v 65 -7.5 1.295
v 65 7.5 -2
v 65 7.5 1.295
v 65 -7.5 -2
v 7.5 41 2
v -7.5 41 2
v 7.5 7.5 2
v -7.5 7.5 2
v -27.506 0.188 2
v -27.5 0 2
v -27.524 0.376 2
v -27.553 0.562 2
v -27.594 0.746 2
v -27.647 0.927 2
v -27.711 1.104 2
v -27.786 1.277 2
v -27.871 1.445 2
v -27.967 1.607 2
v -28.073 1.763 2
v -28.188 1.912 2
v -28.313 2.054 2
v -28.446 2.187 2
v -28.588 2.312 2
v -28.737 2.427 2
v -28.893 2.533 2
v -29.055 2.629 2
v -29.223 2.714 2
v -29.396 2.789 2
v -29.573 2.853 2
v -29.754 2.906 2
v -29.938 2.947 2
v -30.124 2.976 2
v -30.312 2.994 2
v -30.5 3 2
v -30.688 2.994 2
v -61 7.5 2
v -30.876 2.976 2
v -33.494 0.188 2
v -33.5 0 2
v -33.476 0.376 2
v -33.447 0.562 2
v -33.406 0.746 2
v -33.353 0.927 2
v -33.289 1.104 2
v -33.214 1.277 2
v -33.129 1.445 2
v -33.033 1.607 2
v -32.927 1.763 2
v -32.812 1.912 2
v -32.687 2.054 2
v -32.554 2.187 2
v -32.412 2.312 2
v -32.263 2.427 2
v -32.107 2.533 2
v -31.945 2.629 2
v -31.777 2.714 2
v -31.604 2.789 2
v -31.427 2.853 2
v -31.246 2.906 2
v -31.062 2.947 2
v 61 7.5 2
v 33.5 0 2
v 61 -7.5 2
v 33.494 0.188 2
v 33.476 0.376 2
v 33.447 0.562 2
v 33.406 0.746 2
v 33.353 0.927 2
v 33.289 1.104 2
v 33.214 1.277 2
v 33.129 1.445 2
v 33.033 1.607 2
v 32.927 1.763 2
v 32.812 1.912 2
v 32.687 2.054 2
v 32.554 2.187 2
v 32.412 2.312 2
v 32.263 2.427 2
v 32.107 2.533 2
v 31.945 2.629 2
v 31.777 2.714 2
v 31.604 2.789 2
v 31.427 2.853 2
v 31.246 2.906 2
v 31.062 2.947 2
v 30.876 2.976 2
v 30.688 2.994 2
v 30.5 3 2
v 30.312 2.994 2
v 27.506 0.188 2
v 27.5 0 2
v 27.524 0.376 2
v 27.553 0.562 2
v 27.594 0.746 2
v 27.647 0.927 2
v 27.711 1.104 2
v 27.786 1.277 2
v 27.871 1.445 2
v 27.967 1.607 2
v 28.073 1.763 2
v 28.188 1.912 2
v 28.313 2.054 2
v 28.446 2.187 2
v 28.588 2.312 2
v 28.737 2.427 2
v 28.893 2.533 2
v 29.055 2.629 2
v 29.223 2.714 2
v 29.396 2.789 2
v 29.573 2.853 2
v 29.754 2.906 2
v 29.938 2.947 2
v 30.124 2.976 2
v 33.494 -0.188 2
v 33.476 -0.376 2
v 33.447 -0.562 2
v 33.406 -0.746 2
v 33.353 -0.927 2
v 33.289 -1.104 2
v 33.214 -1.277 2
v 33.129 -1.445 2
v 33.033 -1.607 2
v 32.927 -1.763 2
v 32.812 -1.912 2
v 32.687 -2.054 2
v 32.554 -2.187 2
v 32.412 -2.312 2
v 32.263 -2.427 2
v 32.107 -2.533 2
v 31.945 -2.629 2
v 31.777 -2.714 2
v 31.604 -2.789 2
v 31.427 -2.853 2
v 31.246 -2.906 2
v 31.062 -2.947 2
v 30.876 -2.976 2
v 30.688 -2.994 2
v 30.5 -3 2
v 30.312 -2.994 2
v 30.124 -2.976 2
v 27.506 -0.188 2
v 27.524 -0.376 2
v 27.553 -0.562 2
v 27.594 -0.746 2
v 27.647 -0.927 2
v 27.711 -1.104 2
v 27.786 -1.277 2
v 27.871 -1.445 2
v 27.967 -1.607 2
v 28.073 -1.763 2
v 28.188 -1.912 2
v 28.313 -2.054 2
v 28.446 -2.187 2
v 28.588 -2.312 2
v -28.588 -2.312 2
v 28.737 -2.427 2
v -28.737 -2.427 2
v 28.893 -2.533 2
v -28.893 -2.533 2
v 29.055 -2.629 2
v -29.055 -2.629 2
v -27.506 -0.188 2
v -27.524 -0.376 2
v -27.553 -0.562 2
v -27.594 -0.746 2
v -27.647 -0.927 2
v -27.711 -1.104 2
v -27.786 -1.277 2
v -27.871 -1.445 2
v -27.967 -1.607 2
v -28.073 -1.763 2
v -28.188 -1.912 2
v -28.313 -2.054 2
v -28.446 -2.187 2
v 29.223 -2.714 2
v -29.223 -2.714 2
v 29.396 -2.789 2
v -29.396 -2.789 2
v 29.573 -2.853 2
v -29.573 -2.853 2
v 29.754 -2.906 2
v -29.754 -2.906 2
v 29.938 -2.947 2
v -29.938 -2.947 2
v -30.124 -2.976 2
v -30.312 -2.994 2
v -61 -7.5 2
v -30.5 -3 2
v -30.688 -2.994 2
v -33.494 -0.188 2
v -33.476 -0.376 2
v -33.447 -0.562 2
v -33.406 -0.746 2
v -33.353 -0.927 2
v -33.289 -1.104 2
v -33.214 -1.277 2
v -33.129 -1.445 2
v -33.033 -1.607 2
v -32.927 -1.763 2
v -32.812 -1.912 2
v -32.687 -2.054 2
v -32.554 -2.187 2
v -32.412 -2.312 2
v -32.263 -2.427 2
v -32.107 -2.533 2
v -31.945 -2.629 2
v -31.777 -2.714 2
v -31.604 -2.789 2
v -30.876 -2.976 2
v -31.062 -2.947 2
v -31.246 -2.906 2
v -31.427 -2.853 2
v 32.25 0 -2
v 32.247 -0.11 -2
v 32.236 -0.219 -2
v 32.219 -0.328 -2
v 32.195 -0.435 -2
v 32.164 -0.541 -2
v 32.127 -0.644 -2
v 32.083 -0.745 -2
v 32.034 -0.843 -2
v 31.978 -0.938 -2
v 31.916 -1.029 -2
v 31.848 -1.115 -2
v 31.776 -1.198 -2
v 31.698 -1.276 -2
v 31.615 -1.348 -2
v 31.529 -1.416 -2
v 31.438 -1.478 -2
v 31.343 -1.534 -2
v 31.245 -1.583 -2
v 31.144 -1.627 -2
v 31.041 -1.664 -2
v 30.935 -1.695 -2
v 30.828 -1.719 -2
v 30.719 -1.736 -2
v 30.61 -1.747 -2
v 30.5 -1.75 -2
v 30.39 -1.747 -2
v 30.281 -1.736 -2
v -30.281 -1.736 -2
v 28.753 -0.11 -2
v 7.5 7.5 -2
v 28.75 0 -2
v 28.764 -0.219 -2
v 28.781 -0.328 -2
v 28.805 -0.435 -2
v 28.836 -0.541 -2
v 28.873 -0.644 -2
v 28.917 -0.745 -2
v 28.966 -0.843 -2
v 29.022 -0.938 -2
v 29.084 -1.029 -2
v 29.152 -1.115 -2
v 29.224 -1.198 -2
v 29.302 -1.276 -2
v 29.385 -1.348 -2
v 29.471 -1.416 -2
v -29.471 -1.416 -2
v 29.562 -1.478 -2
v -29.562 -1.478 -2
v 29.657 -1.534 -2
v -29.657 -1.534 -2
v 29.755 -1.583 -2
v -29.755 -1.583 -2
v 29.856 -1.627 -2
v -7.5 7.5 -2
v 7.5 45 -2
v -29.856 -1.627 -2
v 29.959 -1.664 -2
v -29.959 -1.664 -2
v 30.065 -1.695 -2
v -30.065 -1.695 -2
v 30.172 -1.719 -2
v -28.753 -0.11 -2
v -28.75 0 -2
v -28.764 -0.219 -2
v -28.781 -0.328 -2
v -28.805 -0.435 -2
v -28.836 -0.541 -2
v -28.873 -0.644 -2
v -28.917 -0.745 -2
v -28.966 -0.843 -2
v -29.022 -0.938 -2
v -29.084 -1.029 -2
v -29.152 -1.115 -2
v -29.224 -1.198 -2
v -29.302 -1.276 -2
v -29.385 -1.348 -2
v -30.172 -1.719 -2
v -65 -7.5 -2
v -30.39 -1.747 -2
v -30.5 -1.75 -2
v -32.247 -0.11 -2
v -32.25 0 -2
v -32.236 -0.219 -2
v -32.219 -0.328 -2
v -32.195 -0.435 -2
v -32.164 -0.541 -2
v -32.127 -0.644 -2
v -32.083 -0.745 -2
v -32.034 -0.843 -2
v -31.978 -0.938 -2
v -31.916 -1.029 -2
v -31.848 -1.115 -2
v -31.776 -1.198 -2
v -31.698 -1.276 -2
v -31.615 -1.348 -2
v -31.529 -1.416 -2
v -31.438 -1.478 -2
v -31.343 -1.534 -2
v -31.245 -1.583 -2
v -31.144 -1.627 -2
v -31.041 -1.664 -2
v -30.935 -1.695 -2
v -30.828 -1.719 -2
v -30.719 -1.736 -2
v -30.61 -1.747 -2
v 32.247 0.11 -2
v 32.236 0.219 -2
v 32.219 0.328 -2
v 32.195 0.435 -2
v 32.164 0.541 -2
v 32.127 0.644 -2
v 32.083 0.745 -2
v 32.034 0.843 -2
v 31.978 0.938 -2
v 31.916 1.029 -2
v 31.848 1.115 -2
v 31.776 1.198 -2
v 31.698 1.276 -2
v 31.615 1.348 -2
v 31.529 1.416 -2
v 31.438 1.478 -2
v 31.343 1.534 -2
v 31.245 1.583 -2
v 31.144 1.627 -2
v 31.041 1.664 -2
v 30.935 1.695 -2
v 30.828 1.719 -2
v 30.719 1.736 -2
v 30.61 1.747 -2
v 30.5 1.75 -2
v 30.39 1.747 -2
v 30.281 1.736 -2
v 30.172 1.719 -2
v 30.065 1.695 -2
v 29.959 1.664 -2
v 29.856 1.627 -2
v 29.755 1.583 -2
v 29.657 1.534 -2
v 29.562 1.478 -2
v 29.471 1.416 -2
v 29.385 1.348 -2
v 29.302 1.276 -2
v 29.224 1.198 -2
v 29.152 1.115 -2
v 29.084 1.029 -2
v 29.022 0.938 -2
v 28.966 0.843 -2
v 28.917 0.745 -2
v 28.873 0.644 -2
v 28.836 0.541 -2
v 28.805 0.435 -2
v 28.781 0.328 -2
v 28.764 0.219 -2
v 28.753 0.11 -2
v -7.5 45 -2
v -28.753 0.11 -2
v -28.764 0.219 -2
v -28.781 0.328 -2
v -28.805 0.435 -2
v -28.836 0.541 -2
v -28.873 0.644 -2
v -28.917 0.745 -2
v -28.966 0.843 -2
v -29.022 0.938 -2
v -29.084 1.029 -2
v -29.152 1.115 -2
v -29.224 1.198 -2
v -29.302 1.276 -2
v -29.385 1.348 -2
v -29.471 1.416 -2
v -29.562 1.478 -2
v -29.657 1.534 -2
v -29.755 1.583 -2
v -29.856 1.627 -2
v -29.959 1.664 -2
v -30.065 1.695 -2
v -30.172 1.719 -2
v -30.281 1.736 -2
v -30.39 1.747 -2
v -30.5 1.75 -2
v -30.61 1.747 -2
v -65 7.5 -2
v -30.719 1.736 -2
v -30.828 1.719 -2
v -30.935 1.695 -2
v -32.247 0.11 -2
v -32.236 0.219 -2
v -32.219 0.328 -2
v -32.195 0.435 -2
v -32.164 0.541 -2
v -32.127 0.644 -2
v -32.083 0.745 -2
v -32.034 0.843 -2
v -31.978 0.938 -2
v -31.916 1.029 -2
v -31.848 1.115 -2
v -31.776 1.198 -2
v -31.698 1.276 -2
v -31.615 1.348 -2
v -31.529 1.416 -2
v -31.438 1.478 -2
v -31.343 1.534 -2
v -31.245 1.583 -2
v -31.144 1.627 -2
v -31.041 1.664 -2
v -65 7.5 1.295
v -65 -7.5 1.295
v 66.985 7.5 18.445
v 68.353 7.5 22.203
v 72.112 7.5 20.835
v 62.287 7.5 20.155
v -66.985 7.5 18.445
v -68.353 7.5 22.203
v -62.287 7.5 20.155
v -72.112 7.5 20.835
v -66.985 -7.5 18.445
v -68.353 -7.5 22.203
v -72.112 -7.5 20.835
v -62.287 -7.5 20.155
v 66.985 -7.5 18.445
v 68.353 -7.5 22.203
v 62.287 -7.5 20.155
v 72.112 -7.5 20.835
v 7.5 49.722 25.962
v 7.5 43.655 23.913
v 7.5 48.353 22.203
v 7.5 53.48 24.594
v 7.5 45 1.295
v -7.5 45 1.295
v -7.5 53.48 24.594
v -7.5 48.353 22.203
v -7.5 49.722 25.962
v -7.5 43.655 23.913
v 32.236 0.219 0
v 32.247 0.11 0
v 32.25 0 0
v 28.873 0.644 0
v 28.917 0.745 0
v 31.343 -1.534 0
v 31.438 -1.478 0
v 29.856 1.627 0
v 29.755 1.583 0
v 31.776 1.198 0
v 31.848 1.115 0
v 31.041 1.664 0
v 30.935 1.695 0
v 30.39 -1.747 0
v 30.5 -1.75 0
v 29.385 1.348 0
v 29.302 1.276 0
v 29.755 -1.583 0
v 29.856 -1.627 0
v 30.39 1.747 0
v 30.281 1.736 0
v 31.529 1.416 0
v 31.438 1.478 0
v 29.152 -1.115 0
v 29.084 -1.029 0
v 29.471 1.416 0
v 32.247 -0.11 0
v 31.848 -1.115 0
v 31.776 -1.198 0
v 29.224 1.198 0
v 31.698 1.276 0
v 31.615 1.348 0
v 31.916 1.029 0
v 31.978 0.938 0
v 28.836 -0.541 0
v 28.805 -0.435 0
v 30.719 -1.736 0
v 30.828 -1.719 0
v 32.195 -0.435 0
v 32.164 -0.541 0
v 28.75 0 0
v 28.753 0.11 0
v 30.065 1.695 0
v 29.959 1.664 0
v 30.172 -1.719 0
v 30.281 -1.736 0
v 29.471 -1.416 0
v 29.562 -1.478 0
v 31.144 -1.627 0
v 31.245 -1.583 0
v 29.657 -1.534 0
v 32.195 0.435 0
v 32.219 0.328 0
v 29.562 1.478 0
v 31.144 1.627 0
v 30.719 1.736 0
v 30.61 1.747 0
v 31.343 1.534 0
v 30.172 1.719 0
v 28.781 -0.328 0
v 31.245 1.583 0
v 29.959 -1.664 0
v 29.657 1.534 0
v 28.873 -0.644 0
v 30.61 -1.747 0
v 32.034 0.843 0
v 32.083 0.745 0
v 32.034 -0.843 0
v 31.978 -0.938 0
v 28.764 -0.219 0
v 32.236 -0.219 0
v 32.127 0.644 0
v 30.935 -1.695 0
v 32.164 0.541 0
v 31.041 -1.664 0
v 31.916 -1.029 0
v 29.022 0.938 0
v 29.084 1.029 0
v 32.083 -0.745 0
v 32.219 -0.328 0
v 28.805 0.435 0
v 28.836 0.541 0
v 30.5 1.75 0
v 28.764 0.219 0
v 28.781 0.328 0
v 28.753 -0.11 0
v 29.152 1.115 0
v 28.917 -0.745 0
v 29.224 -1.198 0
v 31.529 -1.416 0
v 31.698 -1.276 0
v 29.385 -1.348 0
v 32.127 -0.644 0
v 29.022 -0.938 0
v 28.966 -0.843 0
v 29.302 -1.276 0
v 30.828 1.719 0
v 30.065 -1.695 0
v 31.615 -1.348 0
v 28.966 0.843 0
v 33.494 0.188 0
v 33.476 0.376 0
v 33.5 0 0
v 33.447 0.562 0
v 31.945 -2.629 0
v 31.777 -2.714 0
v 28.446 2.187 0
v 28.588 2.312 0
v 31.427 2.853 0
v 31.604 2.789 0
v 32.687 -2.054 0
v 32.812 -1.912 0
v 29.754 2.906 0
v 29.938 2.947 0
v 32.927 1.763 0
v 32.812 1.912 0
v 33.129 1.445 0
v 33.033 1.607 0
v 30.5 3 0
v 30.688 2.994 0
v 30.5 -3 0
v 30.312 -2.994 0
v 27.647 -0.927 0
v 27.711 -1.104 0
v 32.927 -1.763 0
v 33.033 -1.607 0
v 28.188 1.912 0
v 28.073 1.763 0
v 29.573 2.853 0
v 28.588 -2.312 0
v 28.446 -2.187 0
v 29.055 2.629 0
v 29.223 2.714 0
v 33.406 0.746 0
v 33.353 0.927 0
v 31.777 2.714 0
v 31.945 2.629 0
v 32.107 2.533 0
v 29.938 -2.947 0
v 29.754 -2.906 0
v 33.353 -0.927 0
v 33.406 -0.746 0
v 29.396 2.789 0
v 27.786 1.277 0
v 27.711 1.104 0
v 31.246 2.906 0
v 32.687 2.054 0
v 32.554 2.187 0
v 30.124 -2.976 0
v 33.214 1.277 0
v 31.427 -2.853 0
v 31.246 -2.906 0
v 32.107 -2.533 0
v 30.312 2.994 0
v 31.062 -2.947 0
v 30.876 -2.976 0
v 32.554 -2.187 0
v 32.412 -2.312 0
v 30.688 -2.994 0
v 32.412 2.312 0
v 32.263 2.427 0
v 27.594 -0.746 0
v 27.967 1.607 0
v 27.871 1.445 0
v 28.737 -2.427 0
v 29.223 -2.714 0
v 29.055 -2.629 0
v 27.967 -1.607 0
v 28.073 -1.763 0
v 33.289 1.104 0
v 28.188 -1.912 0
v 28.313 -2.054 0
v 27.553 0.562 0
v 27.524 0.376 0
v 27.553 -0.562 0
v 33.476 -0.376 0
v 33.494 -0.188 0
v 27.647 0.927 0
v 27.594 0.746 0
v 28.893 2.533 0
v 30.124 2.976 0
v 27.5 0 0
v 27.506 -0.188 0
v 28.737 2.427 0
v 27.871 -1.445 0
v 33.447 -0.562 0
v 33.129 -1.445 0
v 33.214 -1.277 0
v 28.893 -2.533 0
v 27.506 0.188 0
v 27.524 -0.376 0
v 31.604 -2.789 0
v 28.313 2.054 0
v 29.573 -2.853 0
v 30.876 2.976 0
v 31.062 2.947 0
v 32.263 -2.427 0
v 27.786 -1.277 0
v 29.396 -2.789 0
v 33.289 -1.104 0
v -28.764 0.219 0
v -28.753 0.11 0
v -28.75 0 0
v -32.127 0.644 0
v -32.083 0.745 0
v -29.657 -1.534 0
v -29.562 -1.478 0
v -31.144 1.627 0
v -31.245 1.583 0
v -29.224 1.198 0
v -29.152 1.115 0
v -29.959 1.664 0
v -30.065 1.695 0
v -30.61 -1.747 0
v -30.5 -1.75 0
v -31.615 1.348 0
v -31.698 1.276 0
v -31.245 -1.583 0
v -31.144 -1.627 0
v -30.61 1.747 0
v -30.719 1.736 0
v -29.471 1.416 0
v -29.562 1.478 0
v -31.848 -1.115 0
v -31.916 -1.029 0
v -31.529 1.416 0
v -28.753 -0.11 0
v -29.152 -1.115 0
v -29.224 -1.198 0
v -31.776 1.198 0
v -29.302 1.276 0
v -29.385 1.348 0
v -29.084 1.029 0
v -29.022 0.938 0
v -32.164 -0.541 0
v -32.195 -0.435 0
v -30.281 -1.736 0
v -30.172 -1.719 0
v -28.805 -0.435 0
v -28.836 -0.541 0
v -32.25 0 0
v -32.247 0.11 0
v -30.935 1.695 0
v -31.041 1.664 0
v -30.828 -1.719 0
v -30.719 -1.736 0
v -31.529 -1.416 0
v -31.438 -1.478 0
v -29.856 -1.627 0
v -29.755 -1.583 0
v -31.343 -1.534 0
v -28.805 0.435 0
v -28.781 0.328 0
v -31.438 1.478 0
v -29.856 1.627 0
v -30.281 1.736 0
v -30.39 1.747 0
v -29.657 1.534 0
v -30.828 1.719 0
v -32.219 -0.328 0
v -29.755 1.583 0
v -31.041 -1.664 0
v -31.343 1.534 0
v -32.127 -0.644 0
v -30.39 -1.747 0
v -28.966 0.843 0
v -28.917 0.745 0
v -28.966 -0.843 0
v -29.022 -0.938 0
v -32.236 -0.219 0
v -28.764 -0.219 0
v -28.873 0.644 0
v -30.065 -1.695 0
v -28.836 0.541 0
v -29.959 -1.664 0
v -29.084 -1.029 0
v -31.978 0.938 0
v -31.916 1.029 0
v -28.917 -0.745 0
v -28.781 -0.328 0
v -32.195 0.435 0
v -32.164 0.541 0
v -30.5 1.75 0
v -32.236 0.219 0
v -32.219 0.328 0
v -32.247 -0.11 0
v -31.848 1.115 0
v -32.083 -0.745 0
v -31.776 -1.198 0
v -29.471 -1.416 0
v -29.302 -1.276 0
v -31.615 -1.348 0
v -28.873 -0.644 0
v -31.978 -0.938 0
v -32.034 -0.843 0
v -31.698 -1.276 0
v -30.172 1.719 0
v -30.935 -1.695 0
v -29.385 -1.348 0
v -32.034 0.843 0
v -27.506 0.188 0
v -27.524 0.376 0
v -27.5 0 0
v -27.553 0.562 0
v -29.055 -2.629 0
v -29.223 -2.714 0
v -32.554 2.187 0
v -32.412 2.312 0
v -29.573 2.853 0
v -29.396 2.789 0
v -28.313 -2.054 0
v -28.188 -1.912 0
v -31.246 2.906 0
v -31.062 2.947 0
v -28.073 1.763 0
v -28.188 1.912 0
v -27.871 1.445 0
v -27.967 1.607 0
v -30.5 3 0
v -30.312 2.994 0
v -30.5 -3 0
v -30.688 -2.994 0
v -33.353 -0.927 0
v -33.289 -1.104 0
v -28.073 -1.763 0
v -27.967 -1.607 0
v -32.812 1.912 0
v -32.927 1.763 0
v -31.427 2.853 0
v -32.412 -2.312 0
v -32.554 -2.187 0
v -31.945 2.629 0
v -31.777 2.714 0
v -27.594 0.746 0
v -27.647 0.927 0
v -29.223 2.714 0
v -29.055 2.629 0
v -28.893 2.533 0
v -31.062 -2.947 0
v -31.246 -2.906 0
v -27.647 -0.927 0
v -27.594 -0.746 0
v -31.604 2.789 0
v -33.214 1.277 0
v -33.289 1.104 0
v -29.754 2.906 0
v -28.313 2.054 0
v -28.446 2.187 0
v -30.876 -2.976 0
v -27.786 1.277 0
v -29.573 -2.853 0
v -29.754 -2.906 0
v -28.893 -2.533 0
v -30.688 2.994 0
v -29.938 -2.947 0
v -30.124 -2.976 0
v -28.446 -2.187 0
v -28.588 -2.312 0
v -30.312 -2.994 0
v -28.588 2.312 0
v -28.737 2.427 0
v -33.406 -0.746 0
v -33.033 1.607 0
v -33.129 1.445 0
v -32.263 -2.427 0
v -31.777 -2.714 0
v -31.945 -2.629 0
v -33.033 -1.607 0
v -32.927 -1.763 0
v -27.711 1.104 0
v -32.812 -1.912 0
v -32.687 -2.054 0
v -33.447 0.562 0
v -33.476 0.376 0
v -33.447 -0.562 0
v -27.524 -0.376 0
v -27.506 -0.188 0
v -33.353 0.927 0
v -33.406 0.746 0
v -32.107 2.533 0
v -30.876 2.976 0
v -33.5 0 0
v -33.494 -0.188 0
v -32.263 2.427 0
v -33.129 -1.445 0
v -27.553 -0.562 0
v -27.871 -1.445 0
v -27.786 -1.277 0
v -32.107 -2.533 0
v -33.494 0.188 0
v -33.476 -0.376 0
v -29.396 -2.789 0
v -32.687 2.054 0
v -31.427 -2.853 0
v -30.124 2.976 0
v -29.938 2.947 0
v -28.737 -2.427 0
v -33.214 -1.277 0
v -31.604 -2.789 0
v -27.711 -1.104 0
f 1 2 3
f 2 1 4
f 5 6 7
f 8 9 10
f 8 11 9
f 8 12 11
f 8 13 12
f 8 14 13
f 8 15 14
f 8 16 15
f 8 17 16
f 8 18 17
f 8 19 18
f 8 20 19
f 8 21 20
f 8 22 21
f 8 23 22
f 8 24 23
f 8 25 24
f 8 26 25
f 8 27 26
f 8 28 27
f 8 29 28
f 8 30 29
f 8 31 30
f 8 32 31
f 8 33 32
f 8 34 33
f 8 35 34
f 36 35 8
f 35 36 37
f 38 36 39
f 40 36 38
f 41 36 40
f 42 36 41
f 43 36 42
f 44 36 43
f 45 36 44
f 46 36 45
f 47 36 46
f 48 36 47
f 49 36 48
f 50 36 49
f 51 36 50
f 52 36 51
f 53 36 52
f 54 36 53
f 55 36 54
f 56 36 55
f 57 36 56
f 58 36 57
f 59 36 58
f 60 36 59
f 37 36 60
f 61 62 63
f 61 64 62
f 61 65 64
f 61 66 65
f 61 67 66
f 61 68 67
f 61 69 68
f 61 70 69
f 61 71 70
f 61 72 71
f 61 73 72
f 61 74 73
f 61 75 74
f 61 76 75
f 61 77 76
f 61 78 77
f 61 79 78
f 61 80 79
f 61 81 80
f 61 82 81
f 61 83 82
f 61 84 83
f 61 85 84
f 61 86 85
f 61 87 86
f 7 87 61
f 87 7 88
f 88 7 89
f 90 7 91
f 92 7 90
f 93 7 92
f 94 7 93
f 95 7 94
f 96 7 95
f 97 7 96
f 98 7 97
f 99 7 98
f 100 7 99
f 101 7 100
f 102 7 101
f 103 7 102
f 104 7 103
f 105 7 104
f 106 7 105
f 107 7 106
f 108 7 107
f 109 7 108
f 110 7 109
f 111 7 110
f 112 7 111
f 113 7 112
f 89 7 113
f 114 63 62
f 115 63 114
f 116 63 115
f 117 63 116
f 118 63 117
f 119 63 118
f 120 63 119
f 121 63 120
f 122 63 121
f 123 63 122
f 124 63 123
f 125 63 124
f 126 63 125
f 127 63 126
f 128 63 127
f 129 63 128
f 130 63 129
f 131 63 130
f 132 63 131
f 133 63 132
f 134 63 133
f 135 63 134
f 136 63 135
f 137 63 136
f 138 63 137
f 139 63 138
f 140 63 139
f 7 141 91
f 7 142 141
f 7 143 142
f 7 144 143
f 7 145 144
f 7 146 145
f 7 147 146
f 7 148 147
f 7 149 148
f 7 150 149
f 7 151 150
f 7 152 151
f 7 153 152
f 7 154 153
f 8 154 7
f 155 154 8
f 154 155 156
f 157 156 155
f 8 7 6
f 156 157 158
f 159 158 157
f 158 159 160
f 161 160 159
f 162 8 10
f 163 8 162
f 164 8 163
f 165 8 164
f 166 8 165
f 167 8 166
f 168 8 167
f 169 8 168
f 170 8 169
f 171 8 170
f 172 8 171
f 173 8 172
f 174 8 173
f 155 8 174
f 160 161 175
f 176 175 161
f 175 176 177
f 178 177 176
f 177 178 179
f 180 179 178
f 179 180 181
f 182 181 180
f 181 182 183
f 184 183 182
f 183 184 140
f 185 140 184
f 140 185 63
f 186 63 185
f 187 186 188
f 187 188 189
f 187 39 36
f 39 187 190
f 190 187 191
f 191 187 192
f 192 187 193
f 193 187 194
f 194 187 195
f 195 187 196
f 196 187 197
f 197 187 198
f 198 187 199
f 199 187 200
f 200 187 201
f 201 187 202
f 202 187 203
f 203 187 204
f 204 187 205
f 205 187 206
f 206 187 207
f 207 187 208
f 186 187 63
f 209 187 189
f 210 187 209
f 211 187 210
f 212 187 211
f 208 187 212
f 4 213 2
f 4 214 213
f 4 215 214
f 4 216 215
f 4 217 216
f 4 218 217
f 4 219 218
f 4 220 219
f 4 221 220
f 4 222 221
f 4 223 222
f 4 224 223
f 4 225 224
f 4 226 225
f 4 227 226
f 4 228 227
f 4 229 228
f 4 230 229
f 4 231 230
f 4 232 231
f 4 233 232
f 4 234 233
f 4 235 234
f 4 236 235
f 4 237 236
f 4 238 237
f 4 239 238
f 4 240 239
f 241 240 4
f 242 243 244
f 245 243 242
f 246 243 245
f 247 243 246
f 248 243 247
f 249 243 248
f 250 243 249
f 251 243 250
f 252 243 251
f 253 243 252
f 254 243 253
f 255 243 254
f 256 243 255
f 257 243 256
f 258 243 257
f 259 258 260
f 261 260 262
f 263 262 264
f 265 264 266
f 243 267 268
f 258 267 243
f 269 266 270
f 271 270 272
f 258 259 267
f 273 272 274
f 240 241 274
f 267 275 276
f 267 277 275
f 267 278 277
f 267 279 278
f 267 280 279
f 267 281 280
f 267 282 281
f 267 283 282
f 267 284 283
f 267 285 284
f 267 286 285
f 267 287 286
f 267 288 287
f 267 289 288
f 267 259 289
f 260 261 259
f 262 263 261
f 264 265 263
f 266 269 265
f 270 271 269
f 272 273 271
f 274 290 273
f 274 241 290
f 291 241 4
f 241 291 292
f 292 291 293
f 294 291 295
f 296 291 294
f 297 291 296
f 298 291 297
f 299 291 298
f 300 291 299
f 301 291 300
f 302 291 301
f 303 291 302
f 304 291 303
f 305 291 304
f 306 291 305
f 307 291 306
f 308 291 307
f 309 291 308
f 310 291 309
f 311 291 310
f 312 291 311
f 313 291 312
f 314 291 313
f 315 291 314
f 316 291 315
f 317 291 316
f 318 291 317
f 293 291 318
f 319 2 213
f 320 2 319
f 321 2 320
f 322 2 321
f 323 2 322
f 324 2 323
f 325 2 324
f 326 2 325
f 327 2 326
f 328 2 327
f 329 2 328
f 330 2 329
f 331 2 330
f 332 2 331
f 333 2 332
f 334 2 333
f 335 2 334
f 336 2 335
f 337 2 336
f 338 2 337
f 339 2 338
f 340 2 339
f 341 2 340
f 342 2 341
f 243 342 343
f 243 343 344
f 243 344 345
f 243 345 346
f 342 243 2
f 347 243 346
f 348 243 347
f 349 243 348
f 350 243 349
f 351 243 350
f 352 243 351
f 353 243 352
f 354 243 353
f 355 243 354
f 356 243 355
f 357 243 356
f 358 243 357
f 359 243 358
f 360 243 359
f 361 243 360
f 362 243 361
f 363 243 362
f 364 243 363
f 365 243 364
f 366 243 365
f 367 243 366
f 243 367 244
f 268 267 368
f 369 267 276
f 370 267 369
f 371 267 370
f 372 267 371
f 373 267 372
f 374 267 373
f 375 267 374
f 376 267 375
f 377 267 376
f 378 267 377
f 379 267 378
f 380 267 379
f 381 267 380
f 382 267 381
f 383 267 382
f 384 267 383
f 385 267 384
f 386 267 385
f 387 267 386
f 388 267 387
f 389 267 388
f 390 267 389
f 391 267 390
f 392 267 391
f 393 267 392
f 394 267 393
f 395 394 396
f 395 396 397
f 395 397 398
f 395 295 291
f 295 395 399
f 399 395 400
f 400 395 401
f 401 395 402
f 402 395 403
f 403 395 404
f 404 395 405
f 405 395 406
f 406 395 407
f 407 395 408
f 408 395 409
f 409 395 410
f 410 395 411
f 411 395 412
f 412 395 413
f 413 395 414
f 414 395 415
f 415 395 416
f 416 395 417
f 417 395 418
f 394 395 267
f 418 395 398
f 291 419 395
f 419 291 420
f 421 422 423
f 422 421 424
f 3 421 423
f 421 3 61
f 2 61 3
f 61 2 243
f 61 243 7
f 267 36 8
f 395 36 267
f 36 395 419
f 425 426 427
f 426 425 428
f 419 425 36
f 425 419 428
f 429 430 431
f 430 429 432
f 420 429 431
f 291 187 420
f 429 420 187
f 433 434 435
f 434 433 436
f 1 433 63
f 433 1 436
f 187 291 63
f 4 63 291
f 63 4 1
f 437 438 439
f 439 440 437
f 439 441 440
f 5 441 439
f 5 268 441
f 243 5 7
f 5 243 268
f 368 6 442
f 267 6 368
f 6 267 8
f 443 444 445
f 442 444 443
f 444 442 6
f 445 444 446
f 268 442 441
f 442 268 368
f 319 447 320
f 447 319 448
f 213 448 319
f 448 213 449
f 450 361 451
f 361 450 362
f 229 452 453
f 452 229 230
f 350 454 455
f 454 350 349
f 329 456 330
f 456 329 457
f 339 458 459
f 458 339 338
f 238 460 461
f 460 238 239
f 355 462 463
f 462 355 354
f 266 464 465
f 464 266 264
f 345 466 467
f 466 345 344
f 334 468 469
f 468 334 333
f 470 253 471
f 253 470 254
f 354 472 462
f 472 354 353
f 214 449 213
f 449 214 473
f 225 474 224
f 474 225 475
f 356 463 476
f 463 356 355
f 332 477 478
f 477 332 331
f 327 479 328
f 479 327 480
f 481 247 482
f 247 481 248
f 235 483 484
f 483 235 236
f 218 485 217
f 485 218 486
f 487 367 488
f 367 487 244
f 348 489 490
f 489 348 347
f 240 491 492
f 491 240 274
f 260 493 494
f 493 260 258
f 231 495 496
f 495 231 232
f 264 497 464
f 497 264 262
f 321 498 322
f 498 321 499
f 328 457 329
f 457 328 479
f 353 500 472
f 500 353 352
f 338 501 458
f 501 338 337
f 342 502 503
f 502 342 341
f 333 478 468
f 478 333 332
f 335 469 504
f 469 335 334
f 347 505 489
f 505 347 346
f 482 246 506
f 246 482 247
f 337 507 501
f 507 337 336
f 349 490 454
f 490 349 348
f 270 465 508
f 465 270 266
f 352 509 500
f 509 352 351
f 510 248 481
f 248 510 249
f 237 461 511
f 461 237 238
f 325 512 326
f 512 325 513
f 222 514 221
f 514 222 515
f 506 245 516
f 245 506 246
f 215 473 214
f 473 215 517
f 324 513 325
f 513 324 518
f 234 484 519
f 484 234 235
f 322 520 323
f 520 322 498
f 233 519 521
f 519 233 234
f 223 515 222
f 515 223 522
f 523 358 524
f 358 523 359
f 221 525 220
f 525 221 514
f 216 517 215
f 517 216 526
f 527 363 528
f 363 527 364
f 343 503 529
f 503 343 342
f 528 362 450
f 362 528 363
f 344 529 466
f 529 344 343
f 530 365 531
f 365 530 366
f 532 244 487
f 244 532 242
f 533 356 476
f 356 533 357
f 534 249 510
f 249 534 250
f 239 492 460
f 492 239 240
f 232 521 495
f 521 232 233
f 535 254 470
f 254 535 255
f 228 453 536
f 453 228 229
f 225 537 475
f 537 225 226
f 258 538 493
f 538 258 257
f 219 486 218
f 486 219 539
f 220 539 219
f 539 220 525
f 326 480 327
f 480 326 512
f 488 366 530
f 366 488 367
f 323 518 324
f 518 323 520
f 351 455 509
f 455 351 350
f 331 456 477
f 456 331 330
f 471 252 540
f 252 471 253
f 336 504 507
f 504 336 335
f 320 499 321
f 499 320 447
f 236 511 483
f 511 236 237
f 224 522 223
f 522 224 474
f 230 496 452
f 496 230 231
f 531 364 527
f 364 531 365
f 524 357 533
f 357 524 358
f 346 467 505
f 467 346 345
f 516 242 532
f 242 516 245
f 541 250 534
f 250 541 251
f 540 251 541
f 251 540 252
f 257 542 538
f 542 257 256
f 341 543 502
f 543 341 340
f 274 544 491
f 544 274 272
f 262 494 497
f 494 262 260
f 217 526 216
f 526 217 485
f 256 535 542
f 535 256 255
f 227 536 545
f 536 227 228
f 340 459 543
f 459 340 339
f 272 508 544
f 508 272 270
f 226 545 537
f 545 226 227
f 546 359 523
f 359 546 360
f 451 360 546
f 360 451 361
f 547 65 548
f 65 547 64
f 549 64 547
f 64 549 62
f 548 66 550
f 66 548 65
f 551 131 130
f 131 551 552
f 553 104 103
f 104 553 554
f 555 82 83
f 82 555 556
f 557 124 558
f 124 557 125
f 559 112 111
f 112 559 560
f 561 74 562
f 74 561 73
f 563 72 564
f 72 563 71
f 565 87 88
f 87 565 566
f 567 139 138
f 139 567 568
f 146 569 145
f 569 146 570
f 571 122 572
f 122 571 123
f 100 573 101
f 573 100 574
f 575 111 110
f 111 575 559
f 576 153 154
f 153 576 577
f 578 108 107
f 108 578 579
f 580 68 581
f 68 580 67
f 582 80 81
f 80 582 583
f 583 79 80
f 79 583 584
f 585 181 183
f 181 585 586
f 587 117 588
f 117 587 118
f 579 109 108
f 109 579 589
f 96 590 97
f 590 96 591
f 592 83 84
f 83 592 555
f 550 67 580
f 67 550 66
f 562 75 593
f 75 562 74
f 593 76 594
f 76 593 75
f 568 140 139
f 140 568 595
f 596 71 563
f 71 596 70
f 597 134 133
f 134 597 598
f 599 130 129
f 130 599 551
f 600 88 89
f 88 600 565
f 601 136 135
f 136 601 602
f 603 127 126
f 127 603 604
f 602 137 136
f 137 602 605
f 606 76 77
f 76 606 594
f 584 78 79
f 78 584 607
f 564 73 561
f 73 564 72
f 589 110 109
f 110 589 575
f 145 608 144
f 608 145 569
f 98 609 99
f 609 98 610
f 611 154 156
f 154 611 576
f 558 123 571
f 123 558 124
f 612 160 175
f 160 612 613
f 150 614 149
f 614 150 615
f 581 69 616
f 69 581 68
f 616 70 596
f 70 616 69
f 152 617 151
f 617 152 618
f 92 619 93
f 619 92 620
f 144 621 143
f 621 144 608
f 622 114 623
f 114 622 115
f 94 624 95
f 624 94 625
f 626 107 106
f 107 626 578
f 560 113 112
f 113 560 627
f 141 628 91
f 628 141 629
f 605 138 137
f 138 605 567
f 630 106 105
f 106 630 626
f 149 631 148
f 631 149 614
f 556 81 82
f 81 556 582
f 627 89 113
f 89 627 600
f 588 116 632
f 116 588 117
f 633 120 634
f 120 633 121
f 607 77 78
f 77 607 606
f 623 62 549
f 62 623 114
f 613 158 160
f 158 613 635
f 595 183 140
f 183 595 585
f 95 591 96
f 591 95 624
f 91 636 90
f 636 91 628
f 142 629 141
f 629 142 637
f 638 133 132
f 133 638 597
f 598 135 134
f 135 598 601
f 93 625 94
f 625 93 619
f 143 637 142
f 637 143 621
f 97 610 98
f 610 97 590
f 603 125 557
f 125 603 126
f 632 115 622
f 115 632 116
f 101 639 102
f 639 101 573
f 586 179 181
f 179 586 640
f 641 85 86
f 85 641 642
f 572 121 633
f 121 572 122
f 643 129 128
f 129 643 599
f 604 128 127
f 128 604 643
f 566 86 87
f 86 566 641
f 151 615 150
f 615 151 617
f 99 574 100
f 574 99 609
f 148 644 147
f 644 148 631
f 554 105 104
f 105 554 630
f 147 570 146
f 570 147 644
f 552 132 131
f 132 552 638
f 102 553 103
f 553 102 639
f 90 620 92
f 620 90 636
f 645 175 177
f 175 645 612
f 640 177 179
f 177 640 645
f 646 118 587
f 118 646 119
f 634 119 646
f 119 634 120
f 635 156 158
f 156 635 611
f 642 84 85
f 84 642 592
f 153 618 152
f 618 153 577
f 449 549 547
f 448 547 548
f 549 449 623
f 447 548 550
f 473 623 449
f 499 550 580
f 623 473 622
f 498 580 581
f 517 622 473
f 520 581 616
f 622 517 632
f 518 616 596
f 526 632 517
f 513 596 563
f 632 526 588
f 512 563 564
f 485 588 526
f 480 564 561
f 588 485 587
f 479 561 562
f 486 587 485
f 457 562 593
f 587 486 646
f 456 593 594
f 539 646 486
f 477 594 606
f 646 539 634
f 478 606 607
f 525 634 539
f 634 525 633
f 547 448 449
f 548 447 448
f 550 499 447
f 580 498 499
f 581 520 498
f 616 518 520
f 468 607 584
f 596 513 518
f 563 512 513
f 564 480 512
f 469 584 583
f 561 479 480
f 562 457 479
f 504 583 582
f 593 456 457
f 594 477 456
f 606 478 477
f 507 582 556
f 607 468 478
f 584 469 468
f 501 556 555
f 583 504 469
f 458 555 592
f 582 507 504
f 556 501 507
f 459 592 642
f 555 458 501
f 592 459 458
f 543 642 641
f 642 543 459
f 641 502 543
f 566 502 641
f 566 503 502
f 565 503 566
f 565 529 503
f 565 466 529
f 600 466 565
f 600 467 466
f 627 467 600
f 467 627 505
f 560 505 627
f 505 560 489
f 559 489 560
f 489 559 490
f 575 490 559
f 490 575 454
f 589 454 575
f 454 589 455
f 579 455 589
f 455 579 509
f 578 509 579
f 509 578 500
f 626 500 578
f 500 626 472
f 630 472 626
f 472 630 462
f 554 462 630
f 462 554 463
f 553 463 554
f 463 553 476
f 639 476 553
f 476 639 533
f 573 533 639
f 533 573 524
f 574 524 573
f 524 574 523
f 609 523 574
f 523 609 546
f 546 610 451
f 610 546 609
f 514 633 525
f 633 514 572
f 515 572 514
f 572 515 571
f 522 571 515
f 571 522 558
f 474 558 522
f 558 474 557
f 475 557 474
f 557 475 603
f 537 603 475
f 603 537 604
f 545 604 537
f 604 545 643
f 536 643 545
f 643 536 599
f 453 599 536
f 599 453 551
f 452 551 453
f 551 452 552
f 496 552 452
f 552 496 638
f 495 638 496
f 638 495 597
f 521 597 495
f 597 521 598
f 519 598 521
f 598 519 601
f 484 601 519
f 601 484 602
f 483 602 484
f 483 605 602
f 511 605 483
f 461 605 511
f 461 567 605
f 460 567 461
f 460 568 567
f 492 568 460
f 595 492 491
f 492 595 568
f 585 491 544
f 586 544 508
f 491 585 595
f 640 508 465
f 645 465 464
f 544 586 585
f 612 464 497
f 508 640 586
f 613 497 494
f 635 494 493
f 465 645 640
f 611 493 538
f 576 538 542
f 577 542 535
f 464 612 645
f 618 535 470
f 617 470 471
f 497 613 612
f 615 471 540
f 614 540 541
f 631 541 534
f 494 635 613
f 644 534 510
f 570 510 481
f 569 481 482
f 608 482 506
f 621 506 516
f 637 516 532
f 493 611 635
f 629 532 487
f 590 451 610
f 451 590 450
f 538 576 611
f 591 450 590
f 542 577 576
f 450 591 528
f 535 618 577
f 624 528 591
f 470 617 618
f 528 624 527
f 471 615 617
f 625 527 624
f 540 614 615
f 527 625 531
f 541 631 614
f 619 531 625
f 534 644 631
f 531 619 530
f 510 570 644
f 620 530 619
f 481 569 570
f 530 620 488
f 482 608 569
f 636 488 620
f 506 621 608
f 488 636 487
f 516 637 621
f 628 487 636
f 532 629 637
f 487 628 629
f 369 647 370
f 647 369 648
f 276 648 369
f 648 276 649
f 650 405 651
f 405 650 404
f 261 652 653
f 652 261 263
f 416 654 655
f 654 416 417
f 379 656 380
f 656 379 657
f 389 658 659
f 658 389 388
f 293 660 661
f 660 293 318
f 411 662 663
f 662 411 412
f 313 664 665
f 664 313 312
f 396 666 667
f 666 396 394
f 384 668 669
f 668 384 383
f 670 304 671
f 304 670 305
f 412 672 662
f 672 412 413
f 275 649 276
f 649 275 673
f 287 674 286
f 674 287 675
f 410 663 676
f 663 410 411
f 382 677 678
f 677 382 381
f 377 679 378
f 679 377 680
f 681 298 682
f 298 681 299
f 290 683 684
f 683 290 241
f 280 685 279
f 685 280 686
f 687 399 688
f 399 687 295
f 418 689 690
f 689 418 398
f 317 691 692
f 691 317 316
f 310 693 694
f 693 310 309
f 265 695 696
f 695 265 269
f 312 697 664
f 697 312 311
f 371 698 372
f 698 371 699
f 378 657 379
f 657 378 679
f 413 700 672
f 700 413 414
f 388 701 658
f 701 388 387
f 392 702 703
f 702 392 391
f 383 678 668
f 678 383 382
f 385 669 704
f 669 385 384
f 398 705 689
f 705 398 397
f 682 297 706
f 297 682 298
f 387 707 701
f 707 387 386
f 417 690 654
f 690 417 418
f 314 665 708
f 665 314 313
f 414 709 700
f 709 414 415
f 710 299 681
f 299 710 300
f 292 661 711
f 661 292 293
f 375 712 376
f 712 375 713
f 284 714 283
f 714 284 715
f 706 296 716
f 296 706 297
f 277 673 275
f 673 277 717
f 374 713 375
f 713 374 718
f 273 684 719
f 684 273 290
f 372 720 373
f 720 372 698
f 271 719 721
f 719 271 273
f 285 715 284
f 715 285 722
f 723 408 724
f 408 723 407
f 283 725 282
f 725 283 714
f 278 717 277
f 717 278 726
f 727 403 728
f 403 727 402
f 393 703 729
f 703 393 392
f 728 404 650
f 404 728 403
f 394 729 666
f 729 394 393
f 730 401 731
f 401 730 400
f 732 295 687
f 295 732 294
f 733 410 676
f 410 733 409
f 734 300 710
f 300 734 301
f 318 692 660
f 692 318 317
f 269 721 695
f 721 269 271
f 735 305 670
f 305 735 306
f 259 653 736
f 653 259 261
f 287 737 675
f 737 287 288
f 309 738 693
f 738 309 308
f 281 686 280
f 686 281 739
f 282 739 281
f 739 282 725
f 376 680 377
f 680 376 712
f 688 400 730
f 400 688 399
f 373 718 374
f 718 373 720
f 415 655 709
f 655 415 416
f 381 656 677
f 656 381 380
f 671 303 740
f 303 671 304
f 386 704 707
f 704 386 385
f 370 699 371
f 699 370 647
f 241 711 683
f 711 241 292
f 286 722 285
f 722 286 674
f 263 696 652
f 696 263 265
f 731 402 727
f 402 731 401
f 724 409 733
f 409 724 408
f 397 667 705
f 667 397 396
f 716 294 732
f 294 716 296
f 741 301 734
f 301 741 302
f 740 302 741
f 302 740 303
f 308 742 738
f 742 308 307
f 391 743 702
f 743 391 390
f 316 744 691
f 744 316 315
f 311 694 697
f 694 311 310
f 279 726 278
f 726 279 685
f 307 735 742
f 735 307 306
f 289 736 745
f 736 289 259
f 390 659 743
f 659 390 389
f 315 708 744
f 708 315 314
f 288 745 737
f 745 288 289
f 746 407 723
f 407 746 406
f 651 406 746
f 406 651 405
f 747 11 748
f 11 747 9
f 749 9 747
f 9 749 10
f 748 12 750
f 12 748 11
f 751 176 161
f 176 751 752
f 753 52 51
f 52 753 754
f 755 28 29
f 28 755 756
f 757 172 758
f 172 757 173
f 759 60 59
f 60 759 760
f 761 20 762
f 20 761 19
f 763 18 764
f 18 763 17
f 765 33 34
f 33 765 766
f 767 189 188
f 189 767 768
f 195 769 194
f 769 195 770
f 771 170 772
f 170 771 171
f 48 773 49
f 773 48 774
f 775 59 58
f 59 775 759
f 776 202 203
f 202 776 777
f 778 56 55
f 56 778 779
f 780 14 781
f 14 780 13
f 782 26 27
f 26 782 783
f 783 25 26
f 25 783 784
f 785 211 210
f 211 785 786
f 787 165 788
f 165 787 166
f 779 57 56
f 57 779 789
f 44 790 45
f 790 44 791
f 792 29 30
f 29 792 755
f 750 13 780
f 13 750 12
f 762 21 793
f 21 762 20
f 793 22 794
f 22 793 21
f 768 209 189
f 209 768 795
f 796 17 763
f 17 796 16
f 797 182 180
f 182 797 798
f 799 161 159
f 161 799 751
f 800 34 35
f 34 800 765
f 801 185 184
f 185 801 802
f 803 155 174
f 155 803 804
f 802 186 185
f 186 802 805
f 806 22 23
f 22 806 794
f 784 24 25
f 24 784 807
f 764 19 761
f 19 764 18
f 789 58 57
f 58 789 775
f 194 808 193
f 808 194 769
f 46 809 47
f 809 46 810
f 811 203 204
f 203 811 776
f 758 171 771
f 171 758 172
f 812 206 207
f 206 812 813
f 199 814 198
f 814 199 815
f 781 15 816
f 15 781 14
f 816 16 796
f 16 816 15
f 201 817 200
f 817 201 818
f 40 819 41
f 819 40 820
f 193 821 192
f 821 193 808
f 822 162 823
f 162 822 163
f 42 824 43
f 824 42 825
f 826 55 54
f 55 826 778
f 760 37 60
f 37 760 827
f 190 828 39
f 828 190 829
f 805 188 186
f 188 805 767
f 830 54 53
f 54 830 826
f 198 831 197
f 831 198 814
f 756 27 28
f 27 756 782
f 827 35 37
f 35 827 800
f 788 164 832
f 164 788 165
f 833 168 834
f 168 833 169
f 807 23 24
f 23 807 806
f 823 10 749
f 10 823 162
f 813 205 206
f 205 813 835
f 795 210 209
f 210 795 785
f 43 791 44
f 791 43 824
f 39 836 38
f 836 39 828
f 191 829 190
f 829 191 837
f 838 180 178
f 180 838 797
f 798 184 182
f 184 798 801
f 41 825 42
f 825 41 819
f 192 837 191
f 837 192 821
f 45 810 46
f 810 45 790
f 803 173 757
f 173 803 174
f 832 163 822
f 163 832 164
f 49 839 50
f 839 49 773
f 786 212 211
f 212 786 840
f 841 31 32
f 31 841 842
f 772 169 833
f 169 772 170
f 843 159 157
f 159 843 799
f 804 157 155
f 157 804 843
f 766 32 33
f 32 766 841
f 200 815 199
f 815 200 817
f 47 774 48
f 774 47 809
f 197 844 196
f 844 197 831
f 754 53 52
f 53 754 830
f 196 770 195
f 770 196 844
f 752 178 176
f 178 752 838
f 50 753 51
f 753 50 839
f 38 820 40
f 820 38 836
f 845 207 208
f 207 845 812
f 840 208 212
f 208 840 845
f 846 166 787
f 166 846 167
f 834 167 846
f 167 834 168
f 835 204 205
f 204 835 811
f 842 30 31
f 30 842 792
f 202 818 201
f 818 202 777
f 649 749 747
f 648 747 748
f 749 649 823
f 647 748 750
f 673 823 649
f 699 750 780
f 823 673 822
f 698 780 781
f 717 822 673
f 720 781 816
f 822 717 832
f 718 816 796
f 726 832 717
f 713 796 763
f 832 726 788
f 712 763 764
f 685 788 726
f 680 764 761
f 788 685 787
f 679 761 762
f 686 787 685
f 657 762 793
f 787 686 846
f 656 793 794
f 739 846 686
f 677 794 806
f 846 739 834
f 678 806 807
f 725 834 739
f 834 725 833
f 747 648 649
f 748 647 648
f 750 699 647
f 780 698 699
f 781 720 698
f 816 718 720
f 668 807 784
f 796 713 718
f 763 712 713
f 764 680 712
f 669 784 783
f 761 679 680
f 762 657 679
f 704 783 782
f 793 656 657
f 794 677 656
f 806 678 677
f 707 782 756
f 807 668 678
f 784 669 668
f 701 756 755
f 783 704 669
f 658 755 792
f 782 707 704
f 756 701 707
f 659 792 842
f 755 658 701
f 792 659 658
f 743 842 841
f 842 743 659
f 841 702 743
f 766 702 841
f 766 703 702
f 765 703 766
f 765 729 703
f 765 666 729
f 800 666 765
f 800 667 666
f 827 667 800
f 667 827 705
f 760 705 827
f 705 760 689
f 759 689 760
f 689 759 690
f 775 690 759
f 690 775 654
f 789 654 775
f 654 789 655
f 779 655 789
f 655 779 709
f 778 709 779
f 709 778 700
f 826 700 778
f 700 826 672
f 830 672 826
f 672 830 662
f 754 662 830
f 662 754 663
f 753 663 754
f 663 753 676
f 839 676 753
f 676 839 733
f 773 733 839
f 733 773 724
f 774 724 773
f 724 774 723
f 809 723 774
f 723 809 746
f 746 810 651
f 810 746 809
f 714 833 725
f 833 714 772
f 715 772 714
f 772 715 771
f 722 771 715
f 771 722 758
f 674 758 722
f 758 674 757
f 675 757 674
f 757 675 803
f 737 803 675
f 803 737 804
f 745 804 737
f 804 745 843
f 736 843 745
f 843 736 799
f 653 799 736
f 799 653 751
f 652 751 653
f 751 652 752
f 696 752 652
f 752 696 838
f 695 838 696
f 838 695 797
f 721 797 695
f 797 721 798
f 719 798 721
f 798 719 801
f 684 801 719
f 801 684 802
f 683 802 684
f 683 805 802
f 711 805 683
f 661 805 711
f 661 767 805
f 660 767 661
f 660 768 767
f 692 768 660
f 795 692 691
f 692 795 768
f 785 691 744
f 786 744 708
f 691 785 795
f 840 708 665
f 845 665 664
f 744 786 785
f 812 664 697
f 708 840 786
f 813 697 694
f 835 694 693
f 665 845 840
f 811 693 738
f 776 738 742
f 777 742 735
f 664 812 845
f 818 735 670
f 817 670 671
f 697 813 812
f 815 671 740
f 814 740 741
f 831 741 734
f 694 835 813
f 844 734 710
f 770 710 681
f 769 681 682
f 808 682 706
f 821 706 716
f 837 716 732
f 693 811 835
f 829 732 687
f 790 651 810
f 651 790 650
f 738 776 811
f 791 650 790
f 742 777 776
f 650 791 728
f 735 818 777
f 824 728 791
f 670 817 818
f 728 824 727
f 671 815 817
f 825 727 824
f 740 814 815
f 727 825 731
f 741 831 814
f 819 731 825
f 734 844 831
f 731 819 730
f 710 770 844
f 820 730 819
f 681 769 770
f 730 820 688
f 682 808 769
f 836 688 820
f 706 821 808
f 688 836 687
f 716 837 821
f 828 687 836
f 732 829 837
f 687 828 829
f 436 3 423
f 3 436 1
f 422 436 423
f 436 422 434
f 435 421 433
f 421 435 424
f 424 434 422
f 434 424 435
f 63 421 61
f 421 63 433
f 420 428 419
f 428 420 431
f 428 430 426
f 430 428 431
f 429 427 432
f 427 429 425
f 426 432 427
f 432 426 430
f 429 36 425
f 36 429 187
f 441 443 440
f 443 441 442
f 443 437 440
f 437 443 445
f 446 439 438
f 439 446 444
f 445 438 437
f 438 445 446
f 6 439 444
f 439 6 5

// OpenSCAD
/*
  Wall Support for router
  Dimensions provided are for D-Link DIR605-L model
*/

// wall thickness
wallThick  =   4;

// cross width
width      =   15;

// nail length
nailLength =   5;


// part width in base part
partWidth  =  122;

// part height in base part
partHeight =   82;

// part deep at central part
partDeep   =   17.5;

// part deep at bottom
partDeep2  =   21.5;

// screw dimensions

// screw diameter
screwDiam      = 3.5;

// screw head diameter
screwHeadDiam  = 6;

// screw head height
screwHeadDeep  = 2;

// base cross
difference ()
{
    // base cross
    union () {
        cube( [partWidth+2*wallThick, width, wallThick], center = true );

        translate ([0,partHeight /4,0])
            cube( [width    , partHeight /2 + 2*wallThick,   wallThick], center = true );
    }
    
    // screw holes
    translate ([partWidth/4,0 ,0])
        screwHole(screwDiam, screwHeadDiam, screwHeadDeep);
    
    translate ([-partWidth/4,0 ,0])
        screwHole(screwDiam, screwHeadDiam, screwHeadDeep);
}

// wings
translate ([ (partWidth ) /2 , 0 , wallThick/2 ] )
    wing(partDeep,20);
    
translate ([ -(partWidth ) /2 , 0 ,wallThick/2 ] )
    rotate ([0,0,180])   
        wing(partDeep,20);

translate ([0 , (partHeight) /2 , wallThick /2 ] )
    rotate ([0,0,90])
        wing(partDeep2,20);
    
// wing module
module wing (deep, angle){
    {
        rotate ([0,angle,0])
        translate ([wallThick/2,0,deep/2])
        {
            cube( [wallThick, width, deep], center = true ) ;
            translate ([0,0, ( deep + wallThick)/2]){
                    cube( [wallThick, width, wallThick], center = true ) ;     
            
                rotate ([0,0,270])
                    translate ([0,-wallThick/2,0])
                        prism (width ,nailLength, wallThick);
            }
        }
    }
}

// Screw hole module
module screwHole ( diam , headDiam, headDeep)
{
    translate ([0,0, wallThick/2 - headDeep])
    {
        translate ([0,0,-wallThick/2])
            cylinder (2*wallThick, d = diam, center = true, $fn=100 );
        translate ([0,0,wallThick/2])
            cylinder (wallThick, d = headDiam, center = true , $fn=100);
    }
}

// nail
module prism(l, w, h){
    translate([-l/2,-w,-h/2])
        polyhedron(
            points=[[0,0,0], [l,0,0], [l,w,0], [0,w,0], [0,w,h], [l,w,h]],
            faces=[[0,1,2,3],[5,4,3,2],[0,4,5,1],[0,3,4],[5,2,1]]
       );
}
